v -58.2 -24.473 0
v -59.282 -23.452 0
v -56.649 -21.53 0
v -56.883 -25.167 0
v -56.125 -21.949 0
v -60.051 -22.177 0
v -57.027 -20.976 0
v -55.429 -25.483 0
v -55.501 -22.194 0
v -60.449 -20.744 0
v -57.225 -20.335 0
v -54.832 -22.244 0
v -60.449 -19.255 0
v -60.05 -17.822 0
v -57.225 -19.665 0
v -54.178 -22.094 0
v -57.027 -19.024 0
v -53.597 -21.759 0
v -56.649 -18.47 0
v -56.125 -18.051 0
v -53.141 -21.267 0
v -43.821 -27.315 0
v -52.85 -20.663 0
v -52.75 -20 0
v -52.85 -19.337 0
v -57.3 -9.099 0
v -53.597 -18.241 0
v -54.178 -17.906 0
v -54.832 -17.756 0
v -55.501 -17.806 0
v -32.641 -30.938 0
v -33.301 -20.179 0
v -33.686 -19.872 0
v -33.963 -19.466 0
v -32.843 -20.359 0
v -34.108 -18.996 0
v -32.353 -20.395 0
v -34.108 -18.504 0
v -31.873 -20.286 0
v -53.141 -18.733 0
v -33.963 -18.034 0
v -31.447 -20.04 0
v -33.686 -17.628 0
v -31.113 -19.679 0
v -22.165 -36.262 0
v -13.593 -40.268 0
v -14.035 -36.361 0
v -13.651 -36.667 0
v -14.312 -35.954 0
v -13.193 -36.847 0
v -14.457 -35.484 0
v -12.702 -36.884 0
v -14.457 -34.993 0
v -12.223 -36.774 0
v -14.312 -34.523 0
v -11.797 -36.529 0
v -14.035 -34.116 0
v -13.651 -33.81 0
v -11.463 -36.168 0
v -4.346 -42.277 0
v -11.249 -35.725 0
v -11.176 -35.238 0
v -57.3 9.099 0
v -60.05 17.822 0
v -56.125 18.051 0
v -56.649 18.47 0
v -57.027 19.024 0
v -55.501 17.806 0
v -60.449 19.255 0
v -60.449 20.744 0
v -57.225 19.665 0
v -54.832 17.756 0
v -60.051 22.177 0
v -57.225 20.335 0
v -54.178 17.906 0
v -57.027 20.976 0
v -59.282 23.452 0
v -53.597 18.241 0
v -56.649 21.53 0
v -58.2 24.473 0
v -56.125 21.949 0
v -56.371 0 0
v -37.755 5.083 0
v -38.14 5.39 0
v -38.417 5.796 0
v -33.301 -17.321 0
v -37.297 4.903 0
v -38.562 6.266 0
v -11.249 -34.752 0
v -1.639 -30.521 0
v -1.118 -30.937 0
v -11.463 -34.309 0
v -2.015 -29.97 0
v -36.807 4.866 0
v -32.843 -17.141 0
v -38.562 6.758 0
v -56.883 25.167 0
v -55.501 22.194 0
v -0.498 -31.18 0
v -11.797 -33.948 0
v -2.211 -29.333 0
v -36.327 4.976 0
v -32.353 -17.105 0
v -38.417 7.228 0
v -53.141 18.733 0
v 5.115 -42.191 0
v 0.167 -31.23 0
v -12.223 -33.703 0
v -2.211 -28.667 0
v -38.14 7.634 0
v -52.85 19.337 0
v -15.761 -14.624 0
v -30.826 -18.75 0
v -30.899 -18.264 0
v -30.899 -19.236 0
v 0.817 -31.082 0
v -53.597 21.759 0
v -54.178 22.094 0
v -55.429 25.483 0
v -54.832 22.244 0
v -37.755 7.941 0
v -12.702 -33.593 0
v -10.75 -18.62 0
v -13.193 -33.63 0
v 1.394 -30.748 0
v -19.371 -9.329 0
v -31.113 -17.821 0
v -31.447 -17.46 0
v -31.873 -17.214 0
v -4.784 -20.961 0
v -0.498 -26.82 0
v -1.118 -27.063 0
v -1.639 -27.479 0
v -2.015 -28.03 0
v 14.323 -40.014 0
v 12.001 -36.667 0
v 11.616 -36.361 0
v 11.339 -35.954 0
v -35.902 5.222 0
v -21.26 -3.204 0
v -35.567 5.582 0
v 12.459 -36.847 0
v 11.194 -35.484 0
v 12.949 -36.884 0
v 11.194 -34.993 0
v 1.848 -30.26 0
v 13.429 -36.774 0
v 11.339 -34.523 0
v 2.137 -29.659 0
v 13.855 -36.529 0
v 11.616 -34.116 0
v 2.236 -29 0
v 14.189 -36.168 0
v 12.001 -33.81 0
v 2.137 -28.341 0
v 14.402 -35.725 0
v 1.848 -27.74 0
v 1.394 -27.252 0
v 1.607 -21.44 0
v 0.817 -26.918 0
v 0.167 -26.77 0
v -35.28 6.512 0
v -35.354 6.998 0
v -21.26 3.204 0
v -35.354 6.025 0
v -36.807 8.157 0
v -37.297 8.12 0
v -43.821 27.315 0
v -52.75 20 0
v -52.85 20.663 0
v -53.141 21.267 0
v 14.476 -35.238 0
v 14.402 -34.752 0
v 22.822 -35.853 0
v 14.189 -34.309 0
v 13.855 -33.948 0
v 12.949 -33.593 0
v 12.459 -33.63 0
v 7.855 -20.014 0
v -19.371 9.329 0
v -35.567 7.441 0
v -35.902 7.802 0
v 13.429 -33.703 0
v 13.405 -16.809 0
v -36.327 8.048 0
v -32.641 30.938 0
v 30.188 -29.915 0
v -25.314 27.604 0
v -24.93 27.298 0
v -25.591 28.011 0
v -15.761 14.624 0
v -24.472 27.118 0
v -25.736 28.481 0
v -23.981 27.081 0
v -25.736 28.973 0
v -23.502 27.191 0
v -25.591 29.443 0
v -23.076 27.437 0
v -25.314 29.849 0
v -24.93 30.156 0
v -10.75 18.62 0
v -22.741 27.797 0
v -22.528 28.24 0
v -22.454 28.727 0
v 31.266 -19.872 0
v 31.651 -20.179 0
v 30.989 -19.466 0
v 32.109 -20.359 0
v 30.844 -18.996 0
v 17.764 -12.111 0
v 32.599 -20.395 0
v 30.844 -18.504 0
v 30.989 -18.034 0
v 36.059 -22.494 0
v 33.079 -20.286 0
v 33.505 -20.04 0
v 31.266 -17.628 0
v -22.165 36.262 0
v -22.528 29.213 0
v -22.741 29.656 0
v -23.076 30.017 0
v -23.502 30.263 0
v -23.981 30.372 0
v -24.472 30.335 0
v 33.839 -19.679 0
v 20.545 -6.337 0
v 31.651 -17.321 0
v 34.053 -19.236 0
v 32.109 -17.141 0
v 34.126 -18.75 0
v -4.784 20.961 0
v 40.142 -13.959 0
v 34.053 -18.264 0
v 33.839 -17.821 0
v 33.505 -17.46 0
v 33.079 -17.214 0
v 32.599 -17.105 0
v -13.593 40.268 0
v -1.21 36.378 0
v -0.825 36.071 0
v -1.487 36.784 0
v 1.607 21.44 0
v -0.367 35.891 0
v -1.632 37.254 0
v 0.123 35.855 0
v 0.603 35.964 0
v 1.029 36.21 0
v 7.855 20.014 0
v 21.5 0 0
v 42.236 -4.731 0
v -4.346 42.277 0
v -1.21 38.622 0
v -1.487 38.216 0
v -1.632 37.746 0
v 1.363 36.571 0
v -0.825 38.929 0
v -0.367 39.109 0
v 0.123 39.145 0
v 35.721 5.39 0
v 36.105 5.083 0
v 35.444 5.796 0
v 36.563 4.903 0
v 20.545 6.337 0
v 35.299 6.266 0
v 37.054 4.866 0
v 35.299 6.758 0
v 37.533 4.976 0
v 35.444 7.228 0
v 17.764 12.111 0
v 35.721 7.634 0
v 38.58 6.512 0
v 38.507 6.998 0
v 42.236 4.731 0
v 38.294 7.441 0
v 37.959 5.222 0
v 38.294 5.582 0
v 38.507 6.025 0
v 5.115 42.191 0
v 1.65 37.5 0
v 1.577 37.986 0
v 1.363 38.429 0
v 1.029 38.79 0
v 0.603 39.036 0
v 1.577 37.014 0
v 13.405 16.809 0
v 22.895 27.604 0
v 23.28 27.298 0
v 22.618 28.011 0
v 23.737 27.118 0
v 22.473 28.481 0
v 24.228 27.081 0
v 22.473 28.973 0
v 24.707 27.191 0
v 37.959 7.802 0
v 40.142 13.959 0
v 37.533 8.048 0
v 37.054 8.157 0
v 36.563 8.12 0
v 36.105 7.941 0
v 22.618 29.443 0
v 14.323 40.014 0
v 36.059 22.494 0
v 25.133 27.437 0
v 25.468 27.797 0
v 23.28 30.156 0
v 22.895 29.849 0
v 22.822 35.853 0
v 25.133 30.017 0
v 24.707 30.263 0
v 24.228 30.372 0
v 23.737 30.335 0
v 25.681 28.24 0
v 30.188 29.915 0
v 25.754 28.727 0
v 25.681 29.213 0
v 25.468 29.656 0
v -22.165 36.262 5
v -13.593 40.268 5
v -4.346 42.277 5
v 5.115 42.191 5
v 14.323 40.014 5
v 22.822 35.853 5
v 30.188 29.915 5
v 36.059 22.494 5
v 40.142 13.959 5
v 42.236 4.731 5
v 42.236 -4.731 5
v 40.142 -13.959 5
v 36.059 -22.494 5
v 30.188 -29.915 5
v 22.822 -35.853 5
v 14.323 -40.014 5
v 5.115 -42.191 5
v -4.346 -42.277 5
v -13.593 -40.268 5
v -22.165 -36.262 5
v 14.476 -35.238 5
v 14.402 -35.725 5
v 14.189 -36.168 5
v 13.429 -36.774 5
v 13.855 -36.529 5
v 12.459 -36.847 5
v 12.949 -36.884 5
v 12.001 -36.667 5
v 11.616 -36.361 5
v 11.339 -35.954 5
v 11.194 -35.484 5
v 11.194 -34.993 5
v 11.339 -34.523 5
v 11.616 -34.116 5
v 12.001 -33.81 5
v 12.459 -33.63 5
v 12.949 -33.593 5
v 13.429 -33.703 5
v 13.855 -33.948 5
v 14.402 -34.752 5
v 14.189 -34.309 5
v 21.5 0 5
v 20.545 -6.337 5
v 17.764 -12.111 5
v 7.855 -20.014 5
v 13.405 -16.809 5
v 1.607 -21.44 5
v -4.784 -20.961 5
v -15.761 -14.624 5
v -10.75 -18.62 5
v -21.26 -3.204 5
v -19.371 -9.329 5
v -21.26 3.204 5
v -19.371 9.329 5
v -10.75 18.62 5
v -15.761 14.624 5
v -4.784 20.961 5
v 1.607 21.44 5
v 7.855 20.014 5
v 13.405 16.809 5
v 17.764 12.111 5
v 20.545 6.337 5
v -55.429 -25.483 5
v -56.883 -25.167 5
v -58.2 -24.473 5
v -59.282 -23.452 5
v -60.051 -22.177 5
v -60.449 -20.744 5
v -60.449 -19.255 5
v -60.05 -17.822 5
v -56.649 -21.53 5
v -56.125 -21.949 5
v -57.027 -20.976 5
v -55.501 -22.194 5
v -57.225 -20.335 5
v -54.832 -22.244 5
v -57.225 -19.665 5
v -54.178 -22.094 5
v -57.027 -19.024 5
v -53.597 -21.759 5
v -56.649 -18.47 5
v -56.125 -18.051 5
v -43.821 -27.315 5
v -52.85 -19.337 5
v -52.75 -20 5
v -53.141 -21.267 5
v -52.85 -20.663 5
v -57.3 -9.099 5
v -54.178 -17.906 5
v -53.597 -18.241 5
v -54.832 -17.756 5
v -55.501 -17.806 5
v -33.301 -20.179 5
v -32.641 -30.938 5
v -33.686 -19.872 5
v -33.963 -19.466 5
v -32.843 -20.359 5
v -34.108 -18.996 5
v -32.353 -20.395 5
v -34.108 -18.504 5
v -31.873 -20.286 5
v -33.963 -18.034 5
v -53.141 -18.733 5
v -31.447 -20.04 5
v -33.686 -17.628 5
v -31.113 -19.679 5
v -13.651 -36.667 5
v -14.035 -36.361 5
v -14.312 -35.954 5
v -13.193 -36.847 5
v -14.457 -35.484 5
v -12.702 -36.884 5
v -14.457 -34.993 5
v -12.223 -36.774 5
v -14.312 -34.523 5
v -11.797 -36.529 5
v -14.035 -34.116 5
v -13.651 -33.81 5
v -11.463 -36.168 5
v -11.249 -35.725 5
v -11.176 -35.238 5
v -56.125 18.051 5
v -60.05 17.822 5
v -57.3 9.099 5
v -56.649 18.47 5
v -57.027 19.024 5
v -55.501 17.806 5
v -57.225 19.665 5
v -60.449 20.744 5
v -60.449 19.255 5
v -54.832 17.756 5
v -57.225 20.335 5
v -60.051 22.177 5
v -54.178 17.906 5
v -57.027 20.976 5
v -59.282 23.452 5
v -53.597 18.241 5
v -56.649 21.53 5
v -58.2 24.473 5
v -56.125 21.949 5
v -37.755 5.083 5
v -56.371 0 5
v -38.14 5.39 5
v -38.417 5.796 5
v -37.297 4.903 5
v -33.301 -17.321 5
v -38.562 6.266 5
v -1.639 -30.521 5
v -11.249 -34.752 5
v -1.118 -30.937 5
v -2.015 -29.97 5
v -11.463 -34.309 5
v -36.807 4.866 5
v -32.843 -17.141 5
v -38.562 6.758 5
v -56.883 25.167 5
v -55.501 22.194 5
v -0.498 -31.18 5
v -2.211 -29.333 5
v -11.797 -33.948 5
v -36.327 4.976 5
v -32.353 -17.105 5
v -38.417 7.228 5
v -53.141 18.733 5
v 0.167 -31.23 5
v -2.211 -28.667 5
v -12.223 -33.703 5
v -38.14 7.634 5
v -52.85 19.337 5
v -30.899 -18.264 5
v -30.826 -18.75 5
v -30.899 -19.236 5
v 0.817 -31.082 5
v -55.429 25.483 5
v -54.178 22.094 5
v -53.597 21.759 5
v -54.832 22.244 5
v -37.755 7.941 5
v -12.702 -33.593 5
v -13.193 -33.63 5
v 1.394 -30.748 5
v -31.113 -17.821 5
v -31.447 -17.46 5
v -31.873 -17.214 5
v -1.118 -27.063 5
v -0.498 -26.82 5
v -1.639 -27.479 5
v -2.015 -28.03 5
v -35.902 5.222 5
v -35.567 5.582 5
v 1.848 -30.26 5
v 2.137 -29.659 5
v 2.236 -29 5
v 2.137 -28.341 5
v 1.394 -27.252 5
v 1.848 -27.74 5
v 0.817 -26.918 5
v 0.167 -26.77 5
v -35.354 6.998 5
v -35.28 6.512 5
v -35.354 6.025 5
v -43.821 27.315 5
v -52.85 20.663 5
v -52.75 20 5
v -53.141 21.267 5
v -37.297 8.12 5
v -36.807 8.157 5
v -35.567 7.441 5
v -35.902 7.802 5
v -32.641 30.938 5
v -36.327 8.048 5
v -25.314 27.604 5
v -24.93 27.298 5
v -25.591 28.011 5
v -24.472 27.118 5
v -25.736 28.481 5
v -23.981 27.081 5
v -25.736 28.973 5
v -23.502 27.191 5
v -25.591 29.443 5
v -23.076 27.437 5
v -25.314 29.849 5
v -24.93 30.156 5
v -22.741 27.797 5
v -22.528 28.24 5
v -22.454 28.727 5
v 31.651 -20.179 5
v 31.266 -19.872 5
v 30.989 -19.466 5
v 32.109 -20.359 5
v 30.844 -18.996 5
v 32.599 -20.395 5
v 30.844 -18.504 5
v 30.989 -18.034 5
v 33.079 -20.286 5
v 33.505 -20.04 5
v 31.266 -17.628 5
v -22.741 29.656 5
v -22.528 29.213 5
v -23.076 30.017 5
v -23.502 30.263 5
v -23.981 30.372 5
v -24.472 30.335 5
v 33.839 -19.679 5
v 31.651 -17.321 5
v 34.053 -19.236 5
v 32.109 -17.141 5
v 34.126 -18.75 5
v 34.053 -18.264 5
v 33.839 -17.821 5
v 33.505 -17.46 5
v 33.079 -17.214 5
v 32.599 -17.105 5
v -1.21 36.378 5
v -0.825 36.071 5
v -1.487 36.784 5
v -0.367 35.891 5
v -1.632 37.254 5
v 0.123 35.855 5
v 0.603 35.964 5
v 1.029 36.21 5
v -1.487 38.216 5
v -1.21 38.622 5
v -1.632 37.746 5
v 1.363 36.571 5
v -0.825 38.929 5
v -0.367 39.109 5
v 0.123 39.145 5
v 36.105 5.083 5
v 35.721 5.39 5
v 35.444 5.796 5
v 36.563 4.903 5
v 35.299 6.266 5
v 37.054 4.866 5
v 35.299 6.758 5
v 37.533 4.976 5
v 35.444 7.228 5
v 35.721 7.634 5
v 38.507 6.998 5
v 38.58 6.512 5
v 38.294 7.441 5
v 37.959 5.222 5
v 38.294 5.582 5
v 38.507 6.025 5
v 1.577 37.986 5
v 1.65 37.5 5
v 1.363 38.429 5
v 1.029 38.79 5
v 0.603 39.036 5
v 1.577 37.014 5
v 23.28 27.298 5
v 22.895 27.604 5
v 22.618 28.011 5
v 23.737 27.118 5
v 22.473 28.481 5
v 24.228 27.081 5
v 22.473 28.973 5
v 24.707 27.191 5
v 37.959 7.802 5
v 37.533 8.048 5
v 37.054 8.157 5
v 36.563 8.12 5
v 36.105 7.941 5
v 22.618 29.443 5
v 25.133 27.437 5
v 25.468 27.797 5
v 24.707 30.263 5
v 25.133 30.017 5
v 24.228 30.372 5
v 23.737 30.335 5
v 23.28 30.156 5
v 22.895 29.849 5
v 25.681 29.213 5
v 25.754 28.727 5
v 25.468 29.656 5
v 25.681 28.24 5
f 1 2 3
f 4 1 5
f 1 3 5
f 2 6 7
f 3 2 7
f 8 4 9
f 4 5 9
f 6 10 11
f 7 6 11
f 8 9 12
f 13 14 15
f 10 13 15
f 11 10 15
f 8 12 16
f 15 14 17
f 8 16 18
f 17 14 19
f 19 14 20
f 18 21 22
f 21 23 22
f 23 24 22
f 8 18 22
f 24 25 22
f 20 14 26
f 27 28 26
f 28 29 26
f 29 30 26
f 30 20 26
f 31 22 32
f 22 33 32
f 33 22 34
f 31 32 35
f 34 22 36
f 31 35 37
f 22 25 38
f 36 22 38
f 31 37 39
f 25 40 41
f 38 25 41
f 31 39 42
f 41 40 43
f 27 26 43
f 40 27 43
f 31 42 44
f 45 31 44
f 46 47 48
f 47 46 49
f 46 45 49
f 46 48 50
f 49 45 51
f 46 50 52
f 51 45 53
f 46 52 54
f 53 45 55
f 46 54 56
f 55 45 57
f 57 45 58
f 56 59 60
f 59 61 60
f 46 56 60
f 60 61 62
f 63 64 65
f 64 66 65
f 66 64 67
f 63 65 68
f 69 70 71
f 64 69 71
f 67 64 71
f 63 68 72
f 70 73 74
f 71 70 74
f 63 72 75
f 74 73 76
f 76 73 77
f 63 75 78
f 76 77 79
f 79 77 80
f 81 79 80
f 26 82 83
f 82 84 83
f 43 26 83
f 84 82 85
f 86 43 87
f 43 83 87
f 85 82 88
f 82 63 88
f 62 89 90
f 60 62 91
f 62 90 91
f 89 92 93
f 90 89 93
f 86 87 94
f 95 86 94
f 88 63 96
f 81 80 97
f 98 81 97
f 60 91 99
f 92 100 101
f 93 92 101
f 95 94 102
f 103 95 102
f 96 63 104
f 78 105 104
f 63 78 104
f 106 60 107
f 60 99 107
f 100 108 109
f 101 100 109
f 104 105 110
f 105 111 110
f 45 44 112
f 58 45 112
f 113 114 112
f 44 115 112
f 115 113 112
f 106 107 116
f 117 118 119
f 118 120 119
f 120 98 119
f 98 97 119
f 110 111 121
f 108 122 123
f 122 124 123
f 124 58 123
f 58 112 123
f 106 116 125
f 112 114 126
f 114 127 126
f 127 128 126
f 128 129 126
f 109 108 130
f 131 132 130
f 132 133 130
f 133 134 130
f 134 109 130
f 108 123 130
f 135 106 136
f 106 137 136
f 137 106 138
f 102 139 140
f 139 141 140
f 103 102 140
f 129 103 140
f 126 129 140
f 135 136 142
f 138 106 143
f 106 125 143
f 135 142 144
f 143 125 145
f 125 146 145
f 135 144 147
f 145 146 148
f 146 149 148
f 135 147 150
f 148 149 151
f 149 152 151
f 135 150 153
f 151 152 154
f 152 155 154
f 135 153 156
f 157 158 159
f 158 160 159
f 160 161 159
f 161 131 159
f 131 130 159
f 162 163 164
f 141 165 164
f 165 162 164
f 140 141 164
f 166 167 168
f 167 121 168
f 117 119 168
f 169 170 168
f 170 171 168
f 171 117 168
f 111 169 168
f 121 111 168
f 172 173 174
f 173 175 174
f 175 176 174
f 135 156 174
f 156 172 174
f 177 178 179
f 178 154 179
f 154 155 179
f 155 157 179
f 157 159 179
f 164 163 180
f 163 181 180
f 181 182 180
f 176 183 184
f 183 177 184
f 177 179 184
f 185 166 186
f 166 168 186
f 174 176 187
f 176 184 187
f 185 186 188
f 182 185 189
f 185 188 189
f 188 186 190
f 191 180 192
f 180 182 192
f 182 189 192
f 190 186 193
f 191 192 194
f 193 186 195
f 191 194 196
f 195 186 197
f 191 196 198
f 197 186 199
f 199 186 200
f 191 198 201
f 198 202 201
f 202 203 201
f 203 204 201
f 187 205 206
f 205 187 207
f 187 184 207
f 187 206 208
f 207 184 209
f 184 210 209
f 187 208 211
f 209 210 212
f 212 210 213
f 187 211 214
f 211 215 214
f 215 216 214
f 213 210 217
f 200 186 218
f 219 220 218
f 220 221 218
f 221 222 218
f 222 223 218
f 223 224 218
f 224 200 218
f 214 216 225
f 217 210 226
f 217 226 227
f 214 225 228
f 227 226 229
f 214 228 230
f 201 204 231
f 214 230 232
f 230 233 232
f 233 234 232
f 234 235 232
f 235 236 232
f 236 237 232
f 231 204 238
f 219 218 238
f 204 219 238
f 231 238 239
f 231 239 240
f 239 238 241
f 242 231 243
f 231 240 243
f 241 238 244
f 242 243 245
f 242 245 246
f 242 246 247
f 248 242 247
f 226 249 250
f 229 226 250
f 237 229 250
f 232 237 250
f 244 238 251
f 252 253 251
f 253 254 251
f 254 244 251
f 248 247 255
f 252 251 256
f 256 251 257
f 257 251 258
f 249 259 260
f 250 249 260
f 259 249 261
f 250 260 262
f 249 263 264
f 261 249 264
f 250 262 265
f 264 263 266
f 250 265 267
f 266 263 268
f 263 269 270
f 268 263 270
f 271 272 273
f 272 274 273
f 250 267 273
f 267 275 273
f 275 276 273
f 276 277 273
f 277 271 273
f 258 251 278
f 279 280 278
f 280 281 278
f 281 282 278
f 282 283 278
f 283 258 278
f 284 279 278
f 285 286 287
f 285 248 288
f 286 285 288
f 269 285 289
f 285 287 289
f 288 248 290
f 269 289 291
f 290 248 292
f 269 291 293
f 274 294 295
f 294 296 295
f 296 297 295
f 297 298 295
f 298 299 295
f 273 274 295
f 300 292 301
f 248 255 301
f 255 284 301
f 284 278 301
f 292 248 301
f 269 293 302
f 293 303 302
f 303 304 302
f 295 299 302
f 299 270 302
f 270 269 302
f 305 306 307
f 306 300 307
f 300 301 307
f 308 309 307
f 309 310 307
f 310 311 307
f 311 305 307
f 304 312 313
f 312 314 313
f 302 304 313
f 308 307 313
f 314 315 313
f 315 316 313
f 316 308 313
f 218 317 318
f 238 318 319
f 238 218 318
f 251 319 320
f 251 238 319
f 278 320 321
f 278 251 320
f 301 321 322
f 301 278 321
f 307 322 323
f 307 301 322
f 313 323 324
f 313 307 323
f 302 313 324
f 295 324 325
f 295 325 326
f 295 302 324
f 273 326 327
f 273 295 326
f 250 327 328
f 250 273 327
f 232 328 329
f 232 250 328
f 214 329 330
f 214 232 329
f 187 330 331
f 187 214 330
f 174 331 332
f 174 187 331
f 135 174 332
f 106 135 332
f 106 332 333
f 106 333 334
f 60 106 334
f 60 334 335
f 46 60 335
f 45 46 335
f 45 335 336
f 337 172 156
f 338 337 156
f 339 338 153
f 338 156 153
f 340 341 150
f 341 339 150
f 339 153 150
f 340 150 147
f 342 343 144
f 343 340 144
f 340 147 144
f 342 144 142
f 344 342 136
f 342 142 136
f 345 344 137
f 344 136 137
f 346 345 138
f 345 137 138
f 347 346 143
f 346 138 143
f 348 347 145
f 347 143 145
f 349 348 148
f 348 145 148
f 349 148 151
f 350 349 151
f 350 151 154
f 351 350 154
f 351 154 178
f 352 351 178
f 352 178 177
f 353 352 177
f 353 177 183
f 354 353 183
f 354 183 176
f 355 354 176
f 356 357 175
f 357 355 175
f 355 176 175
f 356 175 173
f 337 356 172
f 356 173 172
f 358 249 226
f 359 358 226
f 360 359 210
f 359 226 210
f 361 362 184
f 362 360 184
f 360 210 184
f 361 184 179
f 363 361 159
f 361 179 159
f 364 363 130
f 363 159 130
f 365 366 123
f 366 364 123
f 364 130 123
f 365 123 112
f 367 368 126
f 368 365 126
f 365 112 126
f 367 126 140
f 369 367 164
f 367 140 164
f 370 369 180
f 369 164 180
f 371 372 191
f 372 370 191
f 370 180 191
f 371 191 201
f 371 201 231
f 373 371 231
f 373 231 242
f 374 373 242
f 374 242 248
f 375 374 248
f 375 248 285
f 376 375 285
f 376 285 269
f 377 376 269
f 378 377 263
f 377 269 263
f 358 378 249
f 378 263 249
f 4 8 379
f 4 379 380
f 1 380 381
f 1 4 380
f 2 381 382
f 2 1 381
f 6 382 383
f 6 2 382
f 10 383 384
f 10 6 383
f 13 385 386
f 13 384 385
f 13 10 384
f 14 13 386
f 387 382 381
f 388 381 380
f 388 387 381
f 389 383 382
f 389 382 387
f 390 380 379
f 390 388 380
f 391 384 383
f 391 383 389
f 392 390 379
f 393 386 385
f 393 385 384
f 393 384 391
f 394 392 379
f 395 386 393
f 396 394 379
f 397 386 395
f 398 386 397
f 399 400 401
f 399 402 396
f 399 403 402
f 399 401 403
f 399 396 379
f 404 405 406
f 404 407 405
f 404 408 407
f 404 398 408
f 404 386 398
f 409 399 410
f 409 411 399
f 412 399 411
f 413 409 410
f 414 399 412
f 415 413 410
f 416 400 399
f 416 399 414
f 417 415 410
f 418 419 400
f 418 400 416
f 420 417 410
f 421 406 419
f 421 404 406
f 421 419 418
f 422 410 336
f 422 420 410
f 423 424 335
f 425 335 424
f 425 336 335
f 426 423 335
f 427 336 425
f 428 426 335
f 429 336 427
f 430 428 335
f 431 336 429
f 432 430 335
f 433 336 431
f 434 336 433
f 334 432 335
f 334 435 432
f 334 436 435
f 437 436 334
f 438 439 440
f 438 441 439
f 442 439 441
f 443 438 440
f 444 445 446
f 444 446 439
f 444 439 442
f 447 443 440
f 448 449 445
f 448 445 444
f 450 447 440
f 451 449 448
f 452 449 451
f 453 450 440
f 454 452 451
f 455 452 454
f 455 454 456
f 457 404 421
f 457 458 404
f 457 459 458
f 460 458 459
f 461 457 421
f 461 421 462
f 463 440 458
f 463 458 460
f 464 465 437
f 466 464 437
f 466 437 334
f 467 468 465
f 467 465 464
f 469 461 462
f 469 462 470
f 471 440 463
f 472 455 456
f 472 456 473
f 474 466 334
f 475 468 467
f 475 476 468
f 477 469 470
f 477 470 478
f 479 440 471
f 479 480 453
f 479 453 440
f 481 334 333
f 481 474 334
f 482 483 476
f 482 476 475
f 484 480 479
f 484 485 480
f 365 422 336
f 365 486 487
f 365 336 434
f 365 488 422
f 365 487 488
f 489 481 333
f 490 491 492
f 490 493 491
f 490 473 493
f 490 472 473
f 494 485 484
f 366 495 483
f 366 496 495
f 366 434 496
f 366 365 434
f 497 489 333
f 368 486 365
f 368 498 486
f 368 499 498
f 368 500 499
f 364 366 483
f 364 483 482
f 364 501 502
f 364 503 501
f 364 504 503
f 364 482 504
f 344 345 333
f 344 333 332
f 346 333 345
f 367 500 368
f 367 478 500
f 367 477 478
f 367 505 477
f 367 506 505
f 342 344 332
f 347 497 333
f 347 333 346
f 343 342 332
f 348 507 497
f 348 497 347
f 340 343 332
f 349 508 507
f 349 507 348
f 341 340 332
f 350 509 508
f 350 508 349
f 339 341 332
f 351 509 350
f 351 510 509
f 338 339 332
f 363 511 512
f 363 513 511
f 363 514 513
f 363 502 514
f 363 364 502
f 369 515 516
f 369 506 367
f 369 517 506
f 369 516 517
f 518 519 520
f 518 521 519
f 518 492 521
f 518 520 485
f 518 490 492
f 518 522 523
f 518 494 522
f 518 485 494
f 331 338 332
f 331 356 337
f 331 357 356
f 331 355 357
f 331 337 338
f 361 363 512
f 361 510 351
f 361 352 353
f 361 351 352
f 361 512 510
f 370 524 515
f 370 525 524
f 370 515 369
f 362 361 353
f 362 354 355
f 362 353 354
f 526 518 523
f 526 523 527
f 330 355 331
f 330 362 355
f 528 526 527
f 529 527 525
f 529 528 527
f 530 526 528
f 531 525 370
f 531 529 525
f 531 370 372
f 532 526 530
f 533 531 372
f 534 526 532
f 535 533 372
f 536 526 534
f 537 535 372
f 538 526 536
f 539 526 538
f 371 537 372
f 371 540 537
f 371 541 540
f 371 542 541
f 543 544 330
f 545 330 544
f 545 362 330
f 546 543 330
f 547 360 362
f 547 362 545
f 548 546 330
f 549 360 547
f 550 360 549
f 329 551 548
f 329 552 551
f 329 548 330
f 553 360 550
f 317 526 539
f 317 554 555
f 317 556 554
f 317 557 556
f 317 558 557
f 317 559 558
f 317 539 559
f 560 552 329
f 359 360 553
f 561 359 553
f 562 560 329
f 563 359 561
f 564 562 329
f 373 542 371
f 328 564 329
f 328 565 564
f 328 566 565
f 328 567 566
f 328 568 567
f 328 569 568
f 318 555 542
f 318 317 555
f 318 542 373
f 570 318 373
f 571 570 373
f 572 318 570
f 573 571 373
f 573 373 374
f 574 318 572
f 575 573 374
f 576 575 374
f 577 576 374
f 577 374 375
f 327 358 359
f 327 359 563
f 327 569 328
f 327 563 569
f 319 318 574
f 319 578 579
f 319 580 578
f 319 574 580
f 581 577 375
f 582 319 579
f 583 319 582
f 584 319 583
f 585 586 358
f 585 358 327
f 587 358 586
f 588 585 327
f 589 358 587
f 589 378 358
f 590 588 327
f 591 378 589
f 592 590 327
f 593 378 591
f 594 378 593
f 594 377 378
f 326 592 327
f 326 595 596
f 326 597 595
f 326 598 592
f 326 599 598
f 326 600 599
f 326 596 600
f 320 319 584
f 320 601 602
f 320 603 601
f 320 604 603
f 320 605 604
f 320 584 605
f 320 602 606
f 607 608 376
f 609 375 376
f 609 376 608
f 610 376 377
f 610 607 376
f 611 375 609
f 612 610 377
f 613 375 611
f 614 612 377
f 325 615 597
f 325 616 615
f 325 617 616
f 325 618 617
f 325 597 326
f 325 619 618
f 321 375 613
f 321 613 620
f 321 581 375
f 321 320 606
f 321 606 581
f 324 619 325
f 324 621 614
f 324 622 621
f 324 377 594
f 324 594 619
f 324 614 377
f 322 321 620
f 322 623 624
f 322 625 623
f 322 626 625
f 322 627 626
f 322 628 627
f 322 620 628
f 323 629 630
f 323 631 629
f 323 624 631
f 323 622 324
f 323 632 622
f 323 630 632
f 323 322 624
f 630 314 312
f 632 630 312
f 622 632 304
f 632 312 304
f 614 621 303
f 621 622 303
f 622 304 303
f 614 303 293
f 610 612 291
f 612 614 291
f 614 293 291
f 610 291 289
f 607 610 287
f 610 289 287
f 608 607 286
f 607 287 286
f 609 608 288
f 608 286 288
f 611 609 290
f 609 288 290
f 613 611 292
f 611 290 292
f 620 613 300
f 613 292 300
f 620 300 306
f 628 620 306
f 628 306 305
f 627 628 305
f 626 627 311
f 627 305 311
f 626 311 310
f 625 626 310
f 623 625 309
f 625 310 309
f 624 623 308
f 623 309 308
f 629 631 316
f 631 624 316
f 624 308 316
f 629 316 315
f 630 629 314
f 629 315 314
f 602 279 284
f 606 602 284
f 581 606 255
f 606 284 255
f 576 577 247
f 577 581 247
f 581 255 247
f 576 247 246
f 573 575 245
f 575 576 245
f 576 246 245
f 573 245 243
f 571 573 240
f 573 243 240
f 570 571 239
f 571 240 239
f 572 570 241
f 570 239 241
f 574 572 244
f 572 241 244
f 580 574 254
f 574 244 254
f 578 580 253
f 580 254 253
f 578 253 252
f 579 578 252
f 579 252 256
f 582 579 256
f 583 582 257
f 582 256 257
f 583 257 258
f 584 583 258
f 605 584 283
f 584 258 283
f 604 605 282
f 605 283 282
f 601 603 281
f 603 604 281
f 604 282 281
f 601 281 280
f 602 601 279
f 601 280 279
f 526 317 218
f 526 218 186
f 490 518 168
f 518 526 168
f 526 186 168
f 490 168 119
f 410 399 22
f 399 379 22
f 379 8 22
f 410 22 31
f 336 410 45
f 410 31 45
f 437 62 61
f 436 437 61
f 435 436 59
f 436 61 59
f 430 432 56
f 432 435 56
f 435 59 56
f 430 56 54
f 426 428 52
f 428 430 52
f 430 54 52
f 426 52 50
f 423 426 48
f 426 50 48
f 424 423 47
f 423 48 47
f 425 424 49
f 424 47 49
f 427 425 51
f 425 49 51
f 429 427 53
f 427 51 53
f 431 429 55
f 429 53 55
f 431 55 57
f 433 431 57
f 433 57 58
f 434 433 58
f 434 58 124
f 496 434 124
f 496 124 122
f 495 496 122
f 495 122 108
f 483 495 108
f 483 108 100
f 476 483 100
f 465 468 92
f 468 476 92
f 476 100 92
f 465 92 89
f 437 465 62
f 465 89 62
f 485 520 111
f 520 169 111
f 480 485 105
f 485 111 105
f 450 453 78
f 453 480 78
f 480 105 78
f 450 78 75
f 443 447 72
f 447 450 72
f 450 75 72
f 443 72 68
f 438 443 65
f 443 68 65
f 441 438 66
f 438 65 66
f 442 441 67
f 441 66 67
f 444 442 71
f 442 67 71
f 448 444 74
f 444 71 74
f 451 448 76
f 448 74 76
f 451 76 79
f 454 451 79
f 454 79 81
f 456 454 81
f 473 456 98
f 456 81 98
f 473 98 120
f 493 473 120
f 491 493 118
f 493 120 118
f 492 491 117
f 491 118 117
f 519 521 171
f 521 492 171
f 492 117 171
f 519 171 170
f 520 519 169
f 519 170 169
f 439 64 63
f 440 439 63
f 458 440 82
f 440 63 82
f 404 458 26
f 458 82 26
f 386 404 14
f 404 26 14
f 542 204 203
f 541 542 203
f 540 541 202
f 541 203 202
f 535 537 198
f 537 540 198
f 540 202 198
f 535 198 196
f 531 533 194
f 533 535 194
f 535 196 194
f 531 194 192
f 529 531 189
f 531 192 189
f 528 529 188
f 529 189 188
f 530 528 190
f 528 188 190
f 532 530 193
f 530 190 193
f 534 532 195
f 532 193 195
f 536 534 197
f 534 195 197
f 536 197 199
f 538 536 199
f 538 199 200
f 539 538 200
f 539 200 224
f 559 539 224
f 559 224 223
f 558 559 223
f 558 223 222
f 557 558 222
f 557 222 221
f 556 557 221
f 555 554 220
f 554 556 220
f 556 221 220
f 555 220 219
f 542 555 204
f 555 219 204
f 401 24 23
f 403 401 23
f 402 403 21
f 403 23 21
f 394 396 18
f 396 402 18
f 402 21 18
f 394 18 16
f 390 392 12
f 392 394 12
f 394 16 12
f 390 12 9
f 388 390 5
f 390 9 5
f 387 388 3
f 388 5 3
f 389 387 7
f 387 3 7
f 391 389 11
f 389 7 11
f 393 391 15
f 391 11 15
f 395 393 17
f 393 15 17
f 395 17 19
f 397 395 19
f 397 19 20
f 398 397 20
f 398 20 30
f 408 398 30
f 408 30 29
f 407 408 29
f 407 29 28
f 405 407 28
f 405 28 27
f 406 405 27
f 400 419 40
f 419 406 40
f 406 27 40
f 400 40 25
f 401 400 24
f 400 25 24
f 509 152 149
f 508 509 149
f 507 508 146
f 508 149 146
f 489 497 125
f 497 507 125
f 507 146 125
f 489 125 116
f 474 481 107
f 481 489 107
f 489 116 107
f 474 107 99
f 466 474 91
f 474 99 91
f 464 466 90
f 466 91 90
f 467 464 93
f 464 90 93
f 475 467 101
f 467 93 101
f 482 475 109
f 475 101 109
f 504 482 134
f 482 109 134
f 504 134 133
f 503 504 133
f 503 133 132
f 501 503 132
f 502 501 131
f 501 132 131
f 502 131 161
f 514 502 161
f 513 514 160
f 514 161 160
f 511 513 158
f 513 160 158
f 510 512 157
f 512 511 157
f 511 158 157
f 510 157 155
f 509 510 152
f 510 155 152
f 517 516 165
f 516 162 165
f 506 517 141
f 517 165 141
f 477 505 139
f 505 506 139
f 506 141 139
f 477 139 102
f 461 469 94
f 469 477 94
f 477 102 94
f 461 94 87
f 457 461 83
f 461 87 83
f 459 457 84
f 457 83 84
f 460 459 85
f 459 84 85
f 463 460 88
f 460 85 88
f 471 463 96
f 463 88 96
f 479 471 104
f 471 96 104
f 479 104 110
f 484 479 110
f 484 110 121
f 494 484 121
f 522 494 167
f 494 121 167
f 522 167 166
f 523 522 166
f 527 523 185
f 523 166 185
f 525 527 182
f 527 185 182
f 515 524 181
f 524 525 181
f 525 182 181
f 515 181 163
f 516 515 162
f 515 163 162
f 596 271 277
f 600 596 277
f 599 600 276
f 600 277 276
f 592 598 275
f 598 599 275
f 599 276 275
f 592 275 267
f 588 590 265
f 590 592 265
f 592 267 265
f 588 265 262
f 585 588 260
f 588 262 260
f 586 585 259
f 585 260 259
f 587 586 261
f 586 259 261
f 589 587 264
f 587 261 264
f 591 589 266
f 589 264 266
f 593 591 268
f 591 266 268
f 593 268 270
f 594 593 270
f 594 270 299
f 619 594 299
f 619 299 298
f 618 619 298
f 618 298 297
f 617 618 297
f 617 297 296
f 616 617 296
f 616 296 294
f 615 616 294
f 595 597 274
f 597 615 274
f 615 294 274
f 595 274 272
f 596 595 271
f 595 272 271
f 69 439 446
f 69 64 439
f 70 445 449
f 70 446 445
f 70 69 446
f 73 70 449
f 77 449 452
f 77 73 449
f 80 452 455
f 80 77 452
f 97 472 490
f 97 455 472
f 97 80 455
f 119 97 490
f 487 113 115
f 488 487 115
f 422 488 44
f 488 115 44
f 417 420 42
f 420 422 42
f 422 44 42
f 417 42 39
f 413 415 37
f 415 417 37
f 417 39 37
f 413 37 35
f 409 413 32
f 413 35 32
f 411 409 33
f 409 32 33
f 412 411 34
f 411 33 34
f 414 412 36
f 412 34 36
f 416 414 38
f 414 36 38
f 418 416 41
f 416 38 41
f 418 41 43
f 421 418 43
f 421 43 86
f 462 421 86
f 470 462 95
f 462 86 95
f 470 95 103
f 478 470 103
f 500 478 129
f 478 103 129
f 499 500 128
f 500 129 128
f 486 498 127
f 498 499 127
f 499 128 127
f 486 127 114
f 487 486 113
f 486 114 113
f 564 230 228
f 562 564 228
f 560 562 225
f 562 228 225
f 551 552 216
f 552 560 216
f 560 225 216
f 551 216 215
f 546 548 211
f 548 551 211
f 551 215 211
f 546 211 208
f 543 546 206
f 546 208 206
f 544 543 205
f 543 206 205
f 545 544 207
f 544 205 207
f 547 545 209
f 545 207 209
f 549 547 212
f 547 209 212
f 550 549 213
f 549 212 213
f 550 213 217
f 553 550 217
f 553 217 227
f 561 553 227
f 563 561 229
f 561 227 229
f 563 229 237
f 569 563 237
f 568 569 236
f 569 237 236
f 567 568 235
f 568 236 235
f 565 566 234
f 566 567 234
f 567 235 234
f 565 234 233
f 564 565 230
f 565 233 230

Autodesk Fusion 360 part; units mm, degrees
sketch "草图1" plane through (0, 0, 0) normal (0, 0, 1) x (1, 0, 0)
  circle A0 centre (0, 0) radius 21.5
  circle A1 centre (0, 0) radius 37.5 construction
  circle A2 centre (0, 0) radius 42.5
  line L0 (0, 0) -> (0, 56.853) construction
  circle A3 centre (0, 37.5) radius 1.65
  circle A4 centre (-24.1045, 28.7267) radius 1.65
  circle A5 centre (-36.9303, 6.5118) radius 1.65
  circle A6 centre (-32.476, -18.75) radius 1.65
  circle A7 centre (-12.8258, -35.2385) radius 1.65
  circle A8 centre (12.8258, -35.2385) radius 1.65
  circle A9 centre (32.476, -18.75) radius 1.65
  circle A10 centre (36.9303, 6.5118) radius 1.65
  circle A11 centre (24.1045, 28.7267) radius 1.65
  line L1 (0, 0) -> (0, -49) construction
  circle A12 centre (0, -29) radius 2.2361
  dimension "d1" = 43
  dimension "d2" = 75
  dimension "d3" = 85
  dimension "d4" = 3.3
  dimension "d6" = 360
  dimension "d8" = 29
extrude "拉伸1" add sketch "草图1" along normal blind 5
sketch "草图5" plane through (0, 0, 0) normal (0, 0, 1) x (1, 0, 0)
  circle A0 centre (-55, 20) radius 2.25
  circle A1 centre (-55, -20) radius 2.25
  circle A2 centre (-55, 20) radius 5.5
  circle A3 centre (-55, -20) radius 5.5
  circle A4 centre (0, 0) radius 42.5
  circle A5 centre (-61.2801, 100.2547) radius 75
  circle A6 centre (-61.2801, -100.2547) radius 75
  circle A7 centre (-101.3708, 0) radius 45
  dimension "d19" = 40
  dimension "d20" = 4.5
  dimension "d21" = 4.5
  dimension "d22" = 20
  dimension "d23" = 11
  dimension "d24" = 11
  dimension "d25" = 85
  dimension "d26" = 150
  dimension "d27" = 55
  dimension "d28" = 150
  dimension "d29" = 90
extrude "拉伸3" add sketch "草图5" along normal blind 5 contours A2 | A2 A3 A4 A5 A6 A7 | A3
